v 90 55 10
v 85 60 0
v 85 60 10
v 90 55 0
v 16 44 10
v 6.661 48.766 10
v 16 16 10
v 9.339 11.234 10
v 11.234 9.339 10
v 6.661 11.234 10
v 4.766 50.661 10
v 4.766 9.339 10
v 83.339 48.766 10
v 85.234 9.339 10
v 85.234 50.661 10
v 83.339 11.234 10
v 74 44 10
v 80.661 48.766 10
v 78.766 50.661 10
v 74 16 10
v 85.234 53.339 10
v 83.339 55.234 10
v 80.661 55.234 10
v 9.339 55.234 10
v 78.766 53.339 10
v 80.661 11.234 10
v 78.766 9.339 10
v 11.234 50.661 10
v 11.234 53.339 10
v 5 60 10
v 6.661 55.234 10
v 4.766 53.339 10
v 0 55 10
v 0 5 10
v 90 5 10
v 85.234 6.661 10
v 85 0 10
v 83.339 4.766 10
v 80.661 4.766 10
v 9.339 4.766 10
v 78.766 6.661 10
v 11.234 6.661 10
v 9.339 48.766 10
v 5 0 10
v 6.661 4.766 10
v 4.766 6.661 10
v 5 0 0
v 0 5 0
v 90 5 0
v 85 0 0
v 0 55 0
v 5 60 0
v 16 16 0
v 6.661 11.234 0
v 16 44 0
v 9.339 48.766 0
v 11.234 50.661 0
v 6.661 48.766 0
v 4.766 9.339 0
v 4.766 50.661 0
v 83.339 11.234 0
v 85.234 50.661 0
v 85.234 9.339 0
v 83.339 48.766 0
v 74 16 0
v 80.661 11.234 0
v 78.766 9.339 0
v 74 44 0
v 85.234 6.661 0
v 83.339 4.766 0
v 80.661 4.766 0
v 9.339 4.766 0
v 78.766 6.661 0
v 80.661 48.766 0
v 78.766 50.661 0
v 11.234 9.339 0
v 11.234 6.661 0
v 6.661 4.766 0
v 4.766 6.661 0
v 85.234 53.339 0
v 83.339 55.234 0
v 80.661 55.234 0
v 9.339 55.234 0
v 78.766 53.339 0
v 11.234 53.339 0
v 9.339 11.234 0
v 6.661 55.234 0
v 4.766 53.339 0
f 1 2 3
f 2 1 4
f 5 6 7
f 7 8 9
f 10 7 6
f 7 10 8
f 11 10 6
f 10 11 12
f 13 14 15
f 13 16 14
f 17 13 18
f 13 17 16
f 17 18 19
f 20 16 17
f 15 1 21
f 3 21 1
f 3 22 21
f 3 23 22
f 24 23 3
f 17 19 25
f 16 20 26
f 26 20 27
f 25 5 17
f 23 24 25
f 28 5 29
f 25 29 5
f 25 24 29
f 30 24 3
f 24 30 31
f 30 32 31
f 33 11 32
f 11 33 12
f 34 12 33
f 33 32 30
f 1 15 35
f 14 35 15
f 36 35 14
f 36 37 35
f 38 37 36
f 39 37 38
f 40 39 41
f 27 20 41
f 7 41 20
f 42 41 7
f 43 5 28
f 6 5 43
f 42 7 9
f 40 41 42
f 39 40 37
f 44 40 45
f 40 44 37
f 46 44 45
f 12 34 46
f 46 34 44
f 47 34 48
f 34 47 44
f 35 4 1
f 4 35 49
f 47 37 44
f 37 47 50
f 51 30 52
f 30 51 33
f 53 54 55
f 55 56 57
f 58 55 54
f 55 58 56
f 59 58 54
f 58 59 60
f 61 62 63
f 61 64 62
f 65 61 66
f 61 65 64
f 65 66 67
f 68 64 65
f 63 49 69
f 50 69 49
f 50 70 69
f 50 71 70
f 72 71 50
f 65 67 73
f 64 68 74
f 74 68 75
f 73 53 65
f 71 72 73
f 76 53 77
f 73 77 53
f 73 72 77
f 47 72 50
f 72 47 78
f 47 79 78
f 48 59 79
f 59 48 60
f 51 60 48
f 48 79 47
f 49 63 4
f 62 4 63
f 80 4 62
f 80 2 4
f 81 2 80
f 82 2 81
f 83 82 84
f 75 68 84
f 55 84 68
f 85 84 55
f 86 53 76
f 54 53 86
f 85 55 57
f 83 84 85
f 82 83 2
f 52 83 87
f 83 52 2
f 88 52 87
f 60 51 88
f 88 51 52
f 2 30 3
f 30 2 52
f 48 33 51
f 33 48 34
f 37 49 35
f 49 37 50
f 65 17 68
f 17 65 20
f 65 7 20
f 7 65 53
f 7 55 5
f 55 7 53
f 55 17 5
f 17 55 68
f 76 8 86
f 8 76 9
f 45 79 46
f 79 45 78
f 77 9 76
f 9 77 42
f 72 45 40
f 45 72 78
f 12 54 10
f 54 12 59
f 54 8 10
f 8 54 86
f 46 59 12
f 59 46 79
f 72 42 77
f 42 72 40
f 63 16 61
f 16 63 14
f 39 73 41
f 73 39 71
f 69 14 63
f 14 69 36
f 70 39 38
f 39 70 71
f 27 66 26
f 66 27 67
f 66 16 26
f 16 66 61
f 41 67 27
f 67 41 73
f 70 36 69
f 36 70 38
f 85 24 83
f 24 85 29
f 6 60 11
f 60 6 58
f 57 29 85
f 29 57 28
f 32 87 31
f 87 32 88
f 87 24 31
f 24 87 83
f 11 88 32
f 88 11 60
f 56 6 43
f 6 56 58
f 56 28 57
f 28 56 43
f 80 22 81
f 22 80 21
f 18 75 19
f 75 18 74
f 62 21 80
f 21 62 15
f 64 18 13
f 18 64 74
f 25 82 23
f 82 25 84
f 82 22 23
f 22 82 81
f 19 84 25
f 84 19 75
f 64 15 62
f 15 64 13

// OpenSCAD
$fn = 32;

// ----------------------------------------------------------------------
// Frame plate: 90 x 60 frame, 16 mm rails
// ----------------------------------------------------------------------

// --- parameters (mm) ---
plate_l = 90;             // plate length, X
plate_w = 60;             // plate width, Y
plate_t = 10;             // plate thickness, Z (extrusion height)
corner_c = 5;             // corner chamfer
frame_bar = 16;           // frame rail width
bolt_r = 3.5;             // corner bolt window radius
bolt_inset = 8;           // bolt centre inset from the edges

win_l = plate_l - 2 * frame_bar;  // window length
win_w = plate_w - 2 * frame_bar;  // window width
bolt_d = 2 * bolt_r;  // corner hole diameter

profile = [[5, 0], [85, 0], [90, 5], [90, 55], [85, 60], [5, 60], [0, 55], [0, 5]];  // primary outline, 8 points, counter clockwise
void_1 = [[16, 16], [74, 16], [74, 44], [16, 44]];  // the window, 4 points
void_2 = [[11.234, 9.339], [9.339, 11.234], [6.661, 11.234], [4.766, 9.339], [4.766, 6.661], [6.661, 4.766], [9.339, 4.766], [11.234, 6.661]];  // corner bolt window, 8 points
void_3 = [[85.234, 9.339], [83.339, 11.234], [80.661, 11.234], [78.766, 9.339], [78.766, 6.661], [80.661, 4.766], [83.339, 4.766], [85.234, 6.661]];  // corner bolt window, 8 points
void_4 = [[11.234, 53.339], [9.339, 55.234], [6.661, 55.234], [4.766, 53.339], [4.766, 50.661], [6.661, 48.766], [9.339, 48.766], [11.234, 50.661]];  // corner bolt window, 8 points
void_5 = [[85.234, 53.339], [83.339, 55.234], [80.661, 55.234], [78.766, 53.339], [78.766, 50.661], [80.661, 48.766], [83.339, 48.766], [85.234, 50.661]];  // corner bolt window, 8 points

// --- the one profile operation ---
difference() {
  linear_extrude(height = plate_t) polygon(points = profile);
  translate([0, 0, -1])
    linear_extrude(height = plate_t + 2) polygon(points = void_1);
  translate([0, 0, -1])
    linear_extrude(height = plate_t + 2) polygon(points = void_2);
  translate([0, 0, -1])
    linear_extrude(height = plate_t + 2) polygon(points = void_3);
  translate([0, 0, -1])
    linear_extrude(height = plate_t + 2) polygon(points = void_4);
  translate([0, 0, -1])
    linear_extrude(height = plate_t + 2) polygon(points = void_5);
}
